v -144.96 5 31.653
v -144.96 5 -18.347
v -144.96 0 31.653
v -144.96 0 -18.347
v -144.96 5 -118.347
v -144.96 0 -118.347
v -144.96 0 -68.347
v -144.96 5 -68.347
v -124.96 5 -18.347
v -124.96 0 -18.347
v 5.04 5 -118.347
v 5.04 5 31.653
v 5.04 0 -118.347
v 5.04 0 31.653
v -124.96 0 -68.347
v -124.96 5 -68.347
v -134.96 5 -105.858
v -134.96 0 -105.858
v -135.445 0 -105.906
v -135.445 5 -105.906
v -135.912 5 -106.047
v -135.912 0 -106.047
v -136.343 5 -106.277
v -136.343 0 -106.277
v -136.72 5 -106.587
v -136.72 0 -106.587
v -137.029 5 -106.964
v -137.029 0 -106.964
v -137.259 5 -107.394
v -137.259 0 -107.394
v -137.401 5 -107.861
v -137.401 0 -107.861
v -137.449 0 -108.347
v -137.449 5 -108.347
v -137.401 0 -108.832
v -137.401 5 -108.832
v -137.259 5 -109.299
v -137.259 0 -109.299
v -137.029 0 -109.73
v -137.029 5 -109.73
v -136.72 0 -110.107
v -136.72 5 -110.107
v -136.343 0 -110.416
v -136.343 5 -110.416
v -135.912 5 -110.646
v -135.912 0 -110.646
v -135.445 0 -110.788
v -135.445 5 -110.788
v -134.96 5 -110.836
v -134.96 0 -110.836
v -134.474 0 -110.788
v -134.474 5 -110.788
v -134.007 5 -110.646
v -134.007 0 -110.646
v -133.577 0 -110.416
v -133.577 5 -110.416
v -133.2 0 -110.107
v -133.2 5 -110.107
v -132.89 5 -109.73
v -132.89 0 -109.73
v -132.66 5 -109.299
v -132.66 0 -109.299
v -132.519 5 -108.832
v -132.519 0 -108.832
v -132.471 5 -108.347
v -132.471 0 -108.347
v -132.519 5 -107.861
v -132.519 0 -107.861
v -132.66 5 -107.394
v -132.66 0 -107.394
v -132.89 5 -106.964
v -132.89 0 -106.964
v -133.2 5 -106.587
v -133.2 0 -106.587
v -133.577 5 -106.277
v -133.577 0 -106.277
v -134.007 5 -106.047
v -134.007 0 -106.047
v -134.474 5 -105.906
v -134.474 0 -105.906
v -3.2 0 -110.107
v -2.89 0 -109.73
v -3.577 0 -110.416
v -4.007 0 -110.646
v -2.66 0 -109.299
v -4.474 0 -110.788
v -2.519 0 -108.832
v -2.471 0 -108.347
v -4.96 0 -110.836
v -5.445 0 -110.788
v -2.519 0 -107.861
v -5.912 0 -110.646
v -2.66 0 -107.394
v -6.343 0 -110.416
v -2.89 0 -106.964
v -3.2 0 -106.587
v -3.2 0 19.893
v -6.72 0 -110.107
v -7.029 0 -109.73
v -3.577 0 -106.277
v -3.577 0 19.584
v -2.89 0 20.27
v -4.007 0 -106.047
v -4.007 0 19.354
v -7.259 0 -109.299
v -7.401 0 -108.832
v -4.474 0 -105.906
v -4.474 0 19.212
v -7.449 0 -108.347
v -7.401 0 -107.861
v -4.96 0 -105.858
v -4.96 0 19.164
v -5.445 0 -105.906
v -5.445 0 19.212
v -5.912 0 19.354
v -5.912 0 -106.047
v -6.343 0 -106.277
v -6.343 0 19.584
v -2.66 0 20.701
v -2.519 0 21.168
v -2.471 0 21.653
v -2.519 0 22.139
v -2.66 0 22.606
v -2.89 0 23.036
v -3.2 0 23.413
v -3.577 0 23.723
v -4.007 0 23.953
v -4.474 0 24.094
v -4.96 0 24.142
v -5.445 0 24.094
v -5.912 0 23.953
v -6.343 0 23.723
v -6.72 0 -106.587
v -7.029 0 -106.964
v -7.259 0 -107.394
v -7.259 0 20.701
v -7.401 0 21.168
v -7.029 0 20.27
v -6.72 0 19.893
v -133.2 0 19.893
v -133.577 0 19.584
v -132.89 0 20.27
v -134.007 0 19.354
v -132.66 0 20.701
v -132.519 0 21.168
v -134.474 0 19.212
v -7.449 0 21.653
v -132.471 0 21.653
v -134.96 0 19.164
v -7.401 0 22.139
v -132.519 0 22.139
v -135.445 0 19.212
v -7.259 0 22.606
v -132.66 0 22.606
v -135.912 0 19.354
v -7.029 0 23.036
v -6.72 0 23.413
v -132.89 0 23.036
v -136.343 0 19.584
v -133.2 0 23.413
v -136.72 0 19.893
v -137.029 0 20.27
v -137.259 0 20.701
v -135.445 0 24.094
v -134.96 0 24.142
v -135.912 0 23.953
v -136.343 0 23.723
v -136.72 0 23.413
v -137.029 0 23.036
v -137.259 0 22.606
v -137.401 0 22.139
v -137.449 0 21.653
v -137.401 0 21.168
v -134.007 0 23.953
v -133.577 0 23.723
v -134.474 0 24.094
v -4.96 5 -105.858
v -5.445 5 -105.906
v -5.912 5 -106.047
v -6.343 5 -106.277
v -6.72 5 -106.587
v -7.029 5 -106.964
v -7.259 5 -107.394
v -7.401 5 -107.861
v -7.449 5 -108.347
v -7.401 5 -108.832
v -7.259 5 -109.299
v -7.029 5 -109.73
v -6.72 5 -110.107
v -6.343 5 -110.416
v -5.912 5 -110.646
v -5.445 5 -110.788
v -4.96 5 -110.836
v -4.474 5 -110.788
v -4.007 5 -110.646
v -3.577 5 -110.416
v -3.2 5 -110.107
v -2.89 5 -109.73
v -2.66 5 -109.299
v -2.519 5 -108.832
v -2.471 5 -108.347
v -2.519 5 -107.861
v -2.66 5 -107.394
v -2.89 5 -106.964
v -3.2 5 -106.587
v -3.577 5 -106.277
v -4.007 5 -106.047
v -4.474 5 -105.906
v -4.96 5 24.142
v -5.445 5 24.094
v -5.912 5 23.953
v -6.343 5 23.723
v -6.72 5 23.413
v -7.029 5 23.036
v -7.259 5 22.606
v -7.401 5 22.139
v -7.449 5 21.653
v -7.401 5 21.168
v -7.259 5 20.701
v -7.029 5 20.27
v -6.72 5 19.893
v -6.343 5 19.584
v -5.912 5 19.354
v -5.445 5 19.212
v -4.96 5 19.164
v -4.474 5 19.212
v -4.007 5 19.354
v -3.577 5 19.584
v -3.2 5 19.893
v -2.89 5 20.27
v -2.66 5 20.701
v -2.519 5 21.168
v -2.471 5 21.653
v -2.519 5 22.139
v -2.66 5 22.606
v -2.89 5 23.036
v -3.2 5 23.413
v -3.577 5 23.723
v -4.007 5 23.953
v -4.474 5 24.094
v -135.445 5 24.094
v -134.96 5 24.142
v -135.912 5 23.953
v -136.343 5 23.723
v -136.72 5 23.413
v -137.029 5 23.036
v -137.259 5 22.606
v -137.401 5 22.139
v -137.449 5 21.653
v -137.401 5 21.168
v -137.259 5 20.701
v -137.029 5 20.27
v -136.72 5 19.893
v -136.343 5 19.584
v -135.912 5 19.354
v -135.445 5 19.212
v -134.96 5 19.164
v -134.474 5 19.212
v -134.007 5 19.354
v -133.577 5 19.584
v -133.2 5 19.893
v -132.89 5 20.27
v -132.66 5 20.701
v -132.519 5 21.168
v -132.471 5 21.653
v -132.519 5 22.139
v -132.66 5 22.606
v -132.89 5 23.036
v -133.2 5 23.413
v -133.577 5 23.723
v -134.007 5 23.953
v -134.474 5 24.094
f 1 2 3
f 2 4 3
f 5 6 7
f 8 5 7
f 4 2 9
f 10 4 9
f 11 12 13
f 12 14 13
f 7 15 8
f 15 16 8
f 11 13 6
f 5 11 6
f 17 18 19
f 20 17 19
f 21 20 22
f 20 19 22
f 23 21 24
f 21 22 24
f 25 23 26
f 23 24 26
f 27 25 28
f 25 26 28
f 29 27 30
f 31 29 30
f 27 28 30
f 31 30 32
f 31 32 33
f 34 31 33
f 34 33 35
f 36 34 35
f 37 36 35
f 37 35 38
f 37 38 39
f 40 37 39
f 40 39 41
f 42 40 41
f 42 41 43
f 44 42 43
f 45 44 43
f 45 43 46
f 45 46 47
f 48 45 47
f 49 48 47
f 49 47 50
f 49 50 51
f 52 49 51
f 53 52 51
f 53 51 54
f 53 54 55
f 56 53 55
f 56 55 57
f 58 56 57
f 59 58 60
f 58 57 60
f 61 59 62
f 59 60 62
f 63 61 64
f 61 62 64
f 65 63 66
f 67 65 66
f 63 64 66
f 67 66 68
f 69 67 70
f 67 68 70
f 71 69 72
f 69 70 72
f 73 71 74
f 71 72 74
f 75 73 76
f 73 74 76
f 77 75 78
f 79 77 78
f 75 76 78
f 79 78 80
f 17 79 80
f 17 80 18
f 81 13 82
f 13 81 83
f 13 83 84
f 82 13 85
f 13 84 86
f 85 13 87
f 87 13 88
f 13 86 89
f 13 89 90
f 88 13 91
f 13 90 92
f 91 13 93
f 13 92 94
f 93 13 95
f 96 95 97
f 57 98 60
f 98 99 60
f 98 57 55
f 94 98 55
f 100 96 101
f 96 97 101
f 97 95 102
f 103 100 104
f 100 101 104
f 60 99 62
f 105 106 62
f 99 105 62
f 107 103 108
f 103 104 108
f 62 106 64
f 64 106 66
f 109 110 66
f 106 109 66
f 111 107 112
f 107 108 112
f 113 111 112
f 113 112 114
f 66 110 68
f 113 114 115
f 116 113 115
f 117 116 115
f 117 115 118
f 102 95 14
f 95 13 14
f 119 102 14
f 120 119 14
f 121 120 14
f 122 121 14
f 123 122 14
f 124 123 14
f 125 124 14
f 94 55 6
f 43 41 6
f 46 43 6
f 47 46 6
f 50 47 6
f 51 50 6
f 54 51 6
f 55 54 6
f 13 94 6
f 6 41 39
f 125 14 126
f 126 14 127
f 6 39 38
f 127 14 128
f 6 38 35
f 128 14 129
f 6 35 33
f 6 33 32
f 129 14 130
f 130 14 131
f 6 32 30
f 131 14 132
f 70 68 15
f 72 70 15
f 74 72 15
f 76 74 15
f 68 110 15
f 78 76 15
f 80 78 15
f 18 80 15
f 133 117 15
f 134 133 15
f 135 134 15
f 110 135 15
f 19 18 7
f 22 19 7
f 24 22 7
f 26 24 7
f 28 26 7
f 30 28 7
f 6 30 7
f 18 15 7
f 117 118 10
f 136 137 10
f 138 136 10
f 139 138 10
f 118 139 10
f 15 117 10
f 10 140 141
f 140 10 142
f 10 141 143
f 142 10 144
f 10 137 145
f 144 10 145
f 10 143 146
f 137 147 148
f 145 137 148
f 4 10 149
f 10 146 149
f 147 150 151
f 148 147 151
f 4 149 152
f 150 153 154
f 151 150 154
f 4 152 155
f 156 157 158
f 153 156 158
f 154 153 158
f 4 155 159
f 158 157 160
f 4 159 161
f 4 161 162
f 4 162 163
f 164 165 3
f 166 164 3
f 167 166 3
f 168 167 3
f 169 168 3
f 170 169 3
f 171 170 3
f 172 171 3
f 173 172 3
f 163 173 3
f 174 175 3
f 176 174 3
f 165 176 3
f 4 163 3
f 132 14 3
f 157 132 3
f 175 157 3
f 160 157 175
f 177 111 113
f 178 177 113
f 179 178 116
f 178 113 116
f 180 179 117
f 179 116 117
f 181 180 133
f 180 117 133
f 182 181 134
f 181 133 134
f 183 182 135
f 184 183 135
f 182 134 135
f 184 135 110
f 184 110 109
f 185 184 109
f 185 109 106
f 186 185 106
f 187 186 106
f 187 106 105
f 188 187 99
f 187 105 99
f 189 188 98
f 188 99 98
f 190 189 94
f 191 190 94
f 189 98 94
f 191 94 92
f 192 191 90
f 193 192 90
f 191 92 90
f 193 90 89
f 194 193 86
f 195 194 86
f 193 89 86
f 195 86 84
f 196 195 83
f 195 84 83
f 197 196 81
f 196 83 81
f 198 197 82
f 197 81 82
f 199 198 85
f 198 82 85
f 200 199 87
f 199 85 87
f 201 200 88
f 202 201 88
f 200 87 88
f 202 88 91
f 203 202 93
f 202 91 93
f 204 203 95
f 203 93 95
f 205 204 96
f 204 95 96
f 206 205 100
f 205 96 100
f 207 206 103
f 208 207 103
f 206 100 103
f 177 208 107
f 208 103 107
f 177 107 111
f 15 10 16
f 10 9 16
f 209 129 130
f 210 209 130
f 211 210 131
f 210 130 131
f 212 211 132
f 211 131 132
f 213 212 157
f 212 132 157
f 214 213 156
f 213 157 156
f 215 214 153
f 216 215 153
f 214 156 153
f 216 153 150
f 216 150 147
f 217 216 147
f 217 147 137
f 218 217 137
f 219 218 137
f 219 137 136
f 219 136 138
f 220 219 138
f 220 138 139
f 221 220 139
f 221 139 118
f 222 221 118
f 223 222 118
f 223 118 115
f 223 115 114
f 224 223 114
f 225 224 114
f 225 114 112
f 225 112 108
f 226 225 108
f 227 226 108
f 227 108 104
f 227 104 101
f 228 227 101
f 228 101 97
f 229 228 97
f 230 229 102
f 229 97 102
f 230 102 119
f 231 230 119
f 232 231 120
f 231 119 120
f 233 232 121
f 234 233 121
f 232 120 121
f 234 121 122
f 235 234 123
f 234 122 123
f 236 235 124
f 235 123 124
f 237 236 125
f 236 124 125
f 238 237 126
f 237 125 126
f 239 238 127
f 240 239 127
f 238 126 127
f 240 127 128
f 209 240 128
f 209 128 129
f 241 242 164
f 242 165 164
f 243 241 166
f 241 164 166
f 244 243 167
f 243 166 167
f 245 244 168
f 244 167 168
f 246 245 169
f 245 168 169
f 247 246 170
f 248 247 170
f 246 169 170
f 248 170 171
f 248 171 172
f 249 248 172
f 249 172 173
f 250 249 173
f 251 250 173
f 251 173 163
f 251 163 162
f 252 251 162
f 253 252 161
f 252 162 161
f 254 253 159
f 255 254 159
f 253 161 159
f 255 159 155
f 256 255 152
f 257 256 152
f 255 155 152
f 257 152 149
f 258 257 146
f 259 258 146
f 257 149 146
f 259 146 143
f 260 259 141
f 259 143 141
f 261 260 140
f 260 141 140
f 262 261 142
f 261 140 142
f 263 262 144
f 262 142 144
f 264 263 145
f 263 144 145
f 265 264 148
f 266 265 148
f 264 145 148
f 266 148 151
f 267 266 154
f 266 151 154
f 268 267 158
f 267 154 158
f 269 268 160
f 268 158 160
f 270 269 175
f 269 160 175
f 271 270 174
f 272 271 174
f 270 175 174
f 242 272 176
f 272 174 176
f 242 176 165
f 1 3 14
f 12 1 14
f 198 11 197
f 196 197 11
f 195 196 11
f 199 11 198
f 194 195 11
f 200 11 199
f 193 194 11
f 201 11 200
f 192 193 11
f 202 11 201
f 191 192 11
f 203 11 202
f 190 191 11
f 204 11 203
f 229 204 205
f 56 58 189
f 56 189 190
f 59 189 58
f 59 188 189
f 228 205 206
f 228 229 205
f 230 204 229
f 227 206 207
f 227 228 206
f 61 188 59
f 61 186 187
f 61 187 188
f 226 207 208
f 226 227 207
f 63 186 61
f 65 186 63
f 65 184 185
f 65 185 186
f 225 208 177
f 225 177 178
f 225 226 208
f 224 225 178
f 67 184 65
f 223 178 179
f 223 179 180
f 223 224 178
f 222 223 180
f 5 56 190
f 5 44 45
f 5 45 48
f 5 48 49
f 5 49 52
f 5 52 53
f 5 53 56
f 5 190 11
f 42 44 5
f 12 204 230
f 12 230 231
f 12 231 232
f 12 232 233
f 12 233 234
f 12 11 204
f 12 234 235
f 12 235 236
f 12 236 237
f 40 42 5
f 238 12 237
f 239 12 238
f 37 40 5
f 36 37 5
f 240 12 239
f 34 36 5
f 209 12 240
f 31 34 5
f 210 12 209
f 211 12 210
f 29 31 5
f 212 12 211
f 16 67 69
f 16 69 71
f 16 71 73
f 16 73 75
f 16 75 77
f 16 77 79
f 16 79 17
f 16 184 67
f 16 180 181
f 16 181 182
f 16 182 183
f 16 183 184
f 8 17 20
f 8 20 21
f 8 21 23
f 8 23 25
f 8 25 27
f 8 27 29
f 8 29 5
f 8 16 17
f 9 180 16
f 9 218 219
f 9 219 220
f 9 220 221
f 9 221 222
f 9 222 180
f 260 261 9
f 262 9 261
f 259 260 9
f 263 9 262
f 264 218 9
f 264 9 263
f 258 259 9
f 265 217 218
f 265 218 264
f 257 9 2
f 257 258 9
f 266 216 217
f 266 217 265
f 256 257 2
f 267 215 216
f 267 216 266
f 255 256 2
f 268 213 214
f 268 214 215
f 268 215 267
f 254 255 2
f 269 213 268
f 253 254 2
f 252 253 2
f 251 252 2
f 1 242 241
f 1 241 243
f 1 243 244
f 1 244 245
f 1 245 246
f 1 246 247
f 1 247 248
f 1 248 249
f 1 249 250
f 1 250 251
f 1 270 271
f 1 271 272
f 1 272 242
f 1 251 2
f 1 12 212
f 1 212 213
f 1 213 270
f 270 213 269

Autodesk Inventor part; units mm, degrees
ref_plane "YZ Plane" through (0, 0, 0) normal (1, 0, 0) x (0, 1, 0)
ref_plane "XZ Plane" through (0, 0, 0) normal (0, 1, 0) x (-1, 0, 0)
ref_plane "XY Plane" through (0, 0, 0) normal (0, 0, 1) x (1, 0, 0)
sketch "Skizze1" plane through (0, 0, 0) normal (0, 1, 0) x (-1, 0, 0)
  line L0 (144.9597, 31.6532) -> (-5.0403, 31.6532)
  line L1 (-5.0403, 31.6532) -> (-5.0403, -118.3468)
  line L2 (-5.0403, -118.3468) -> (144.9597, -118.3468)
  line L3 (144.9597, -118.3468) -> (144.9597, 31.6532)
  line L4 (144.9597, 31.6532) -> (-5.0403, -118.3468) construction
  line L5 (-5.0403, 31.6532) -> (144.9597, -118.3468) construction
  point P0 (0, 0)
  point P1 (69.9597, -43.3468)
  dimension "d0" = 150
  dimension "d1" = 150
extrude "Extrusion1" add sketch "Skizze1" along normal blind 5
sketch "Skizze2" plane through (0, 5, 0) normal (0, 1, 0) x (1, 0, 0)
  circle A0 centre (-134.9597, -21.6532) radius 2.5
  circle A1 centre (-134.9597, 108.3468) radius 2.5
  circle A2 centre (-4.9597, -21.6532) radius 2.5
  circle A3 centre (-4.9597, 108.3468) radius 2.5
  line L0 (-144.9597, 118.3468) -> (-144.9597, -31.6532) projected
  line L1 (-144.9597, -31.6532) -> (5.0403, -31.6532) projected
  line L2 (5.0403, 118.3468) -> (-144.9597, 118.3468) projected
  line L3 (5.0403, -31.6532) -> (5.0403, 118.3468) projected
  point P0 (0, 0)
  dimension "d4" = 5
  dimension "d5" = 5
  dimension "d6" = 5
  dimension "d7" = 5
  dimension "d8" = 10
  dimension "d9" = 10
  dimension "d15" = 10
  dimension "d16" = 10
  dimension "d17" = 10
  dimension "d18" = 10
  dimension "d19" = 10
  dimension "d20" = 10
hole "Bohrung1" at (-134.9597, 5, 21.6532) at (-134.9597, 5, -108.3468) at (-4.9597, 5, -108.3468) at (-4.9597, 5, 21.6532) direction (0, -1, 0) diameter 4.978 depth 19.05 tip angle 118 thread size "1/4-20 UNC" class "2B" standard "ANSI Unified Screw Threads"
sketch "Skizze3" plane through (0, 5, 0) normal (0, 1, 0) x (1, 0, 0)
  line L0 (-144.9597, 118.3468) -> (-144.9597, -31.6532) projected
  line L1 (-144.9597, 18.3468) -> (-124.9597, 18.3468)
  line L2 (-124.9597, 18.3468) -> (-124.9597, 68.3468)
  line L3 (-124.9597, 68.3468) -> (-144.9597, 68.3468)
  line L4 (-144.9597, 68.3468) -> (-144.9597, 18.3468)
  line L5 (-144.9597, -31.6532) -> (5.0403, -31.6532) projected
  point P0 (0, 0)
  dimension "d28" = 20
  dimension "d29" = 50
  dimension "d30" = 50
extrude "Extrusion2" cut sketch "Skizze3" against normal blind 10
properties part number "Grundplatte1"
